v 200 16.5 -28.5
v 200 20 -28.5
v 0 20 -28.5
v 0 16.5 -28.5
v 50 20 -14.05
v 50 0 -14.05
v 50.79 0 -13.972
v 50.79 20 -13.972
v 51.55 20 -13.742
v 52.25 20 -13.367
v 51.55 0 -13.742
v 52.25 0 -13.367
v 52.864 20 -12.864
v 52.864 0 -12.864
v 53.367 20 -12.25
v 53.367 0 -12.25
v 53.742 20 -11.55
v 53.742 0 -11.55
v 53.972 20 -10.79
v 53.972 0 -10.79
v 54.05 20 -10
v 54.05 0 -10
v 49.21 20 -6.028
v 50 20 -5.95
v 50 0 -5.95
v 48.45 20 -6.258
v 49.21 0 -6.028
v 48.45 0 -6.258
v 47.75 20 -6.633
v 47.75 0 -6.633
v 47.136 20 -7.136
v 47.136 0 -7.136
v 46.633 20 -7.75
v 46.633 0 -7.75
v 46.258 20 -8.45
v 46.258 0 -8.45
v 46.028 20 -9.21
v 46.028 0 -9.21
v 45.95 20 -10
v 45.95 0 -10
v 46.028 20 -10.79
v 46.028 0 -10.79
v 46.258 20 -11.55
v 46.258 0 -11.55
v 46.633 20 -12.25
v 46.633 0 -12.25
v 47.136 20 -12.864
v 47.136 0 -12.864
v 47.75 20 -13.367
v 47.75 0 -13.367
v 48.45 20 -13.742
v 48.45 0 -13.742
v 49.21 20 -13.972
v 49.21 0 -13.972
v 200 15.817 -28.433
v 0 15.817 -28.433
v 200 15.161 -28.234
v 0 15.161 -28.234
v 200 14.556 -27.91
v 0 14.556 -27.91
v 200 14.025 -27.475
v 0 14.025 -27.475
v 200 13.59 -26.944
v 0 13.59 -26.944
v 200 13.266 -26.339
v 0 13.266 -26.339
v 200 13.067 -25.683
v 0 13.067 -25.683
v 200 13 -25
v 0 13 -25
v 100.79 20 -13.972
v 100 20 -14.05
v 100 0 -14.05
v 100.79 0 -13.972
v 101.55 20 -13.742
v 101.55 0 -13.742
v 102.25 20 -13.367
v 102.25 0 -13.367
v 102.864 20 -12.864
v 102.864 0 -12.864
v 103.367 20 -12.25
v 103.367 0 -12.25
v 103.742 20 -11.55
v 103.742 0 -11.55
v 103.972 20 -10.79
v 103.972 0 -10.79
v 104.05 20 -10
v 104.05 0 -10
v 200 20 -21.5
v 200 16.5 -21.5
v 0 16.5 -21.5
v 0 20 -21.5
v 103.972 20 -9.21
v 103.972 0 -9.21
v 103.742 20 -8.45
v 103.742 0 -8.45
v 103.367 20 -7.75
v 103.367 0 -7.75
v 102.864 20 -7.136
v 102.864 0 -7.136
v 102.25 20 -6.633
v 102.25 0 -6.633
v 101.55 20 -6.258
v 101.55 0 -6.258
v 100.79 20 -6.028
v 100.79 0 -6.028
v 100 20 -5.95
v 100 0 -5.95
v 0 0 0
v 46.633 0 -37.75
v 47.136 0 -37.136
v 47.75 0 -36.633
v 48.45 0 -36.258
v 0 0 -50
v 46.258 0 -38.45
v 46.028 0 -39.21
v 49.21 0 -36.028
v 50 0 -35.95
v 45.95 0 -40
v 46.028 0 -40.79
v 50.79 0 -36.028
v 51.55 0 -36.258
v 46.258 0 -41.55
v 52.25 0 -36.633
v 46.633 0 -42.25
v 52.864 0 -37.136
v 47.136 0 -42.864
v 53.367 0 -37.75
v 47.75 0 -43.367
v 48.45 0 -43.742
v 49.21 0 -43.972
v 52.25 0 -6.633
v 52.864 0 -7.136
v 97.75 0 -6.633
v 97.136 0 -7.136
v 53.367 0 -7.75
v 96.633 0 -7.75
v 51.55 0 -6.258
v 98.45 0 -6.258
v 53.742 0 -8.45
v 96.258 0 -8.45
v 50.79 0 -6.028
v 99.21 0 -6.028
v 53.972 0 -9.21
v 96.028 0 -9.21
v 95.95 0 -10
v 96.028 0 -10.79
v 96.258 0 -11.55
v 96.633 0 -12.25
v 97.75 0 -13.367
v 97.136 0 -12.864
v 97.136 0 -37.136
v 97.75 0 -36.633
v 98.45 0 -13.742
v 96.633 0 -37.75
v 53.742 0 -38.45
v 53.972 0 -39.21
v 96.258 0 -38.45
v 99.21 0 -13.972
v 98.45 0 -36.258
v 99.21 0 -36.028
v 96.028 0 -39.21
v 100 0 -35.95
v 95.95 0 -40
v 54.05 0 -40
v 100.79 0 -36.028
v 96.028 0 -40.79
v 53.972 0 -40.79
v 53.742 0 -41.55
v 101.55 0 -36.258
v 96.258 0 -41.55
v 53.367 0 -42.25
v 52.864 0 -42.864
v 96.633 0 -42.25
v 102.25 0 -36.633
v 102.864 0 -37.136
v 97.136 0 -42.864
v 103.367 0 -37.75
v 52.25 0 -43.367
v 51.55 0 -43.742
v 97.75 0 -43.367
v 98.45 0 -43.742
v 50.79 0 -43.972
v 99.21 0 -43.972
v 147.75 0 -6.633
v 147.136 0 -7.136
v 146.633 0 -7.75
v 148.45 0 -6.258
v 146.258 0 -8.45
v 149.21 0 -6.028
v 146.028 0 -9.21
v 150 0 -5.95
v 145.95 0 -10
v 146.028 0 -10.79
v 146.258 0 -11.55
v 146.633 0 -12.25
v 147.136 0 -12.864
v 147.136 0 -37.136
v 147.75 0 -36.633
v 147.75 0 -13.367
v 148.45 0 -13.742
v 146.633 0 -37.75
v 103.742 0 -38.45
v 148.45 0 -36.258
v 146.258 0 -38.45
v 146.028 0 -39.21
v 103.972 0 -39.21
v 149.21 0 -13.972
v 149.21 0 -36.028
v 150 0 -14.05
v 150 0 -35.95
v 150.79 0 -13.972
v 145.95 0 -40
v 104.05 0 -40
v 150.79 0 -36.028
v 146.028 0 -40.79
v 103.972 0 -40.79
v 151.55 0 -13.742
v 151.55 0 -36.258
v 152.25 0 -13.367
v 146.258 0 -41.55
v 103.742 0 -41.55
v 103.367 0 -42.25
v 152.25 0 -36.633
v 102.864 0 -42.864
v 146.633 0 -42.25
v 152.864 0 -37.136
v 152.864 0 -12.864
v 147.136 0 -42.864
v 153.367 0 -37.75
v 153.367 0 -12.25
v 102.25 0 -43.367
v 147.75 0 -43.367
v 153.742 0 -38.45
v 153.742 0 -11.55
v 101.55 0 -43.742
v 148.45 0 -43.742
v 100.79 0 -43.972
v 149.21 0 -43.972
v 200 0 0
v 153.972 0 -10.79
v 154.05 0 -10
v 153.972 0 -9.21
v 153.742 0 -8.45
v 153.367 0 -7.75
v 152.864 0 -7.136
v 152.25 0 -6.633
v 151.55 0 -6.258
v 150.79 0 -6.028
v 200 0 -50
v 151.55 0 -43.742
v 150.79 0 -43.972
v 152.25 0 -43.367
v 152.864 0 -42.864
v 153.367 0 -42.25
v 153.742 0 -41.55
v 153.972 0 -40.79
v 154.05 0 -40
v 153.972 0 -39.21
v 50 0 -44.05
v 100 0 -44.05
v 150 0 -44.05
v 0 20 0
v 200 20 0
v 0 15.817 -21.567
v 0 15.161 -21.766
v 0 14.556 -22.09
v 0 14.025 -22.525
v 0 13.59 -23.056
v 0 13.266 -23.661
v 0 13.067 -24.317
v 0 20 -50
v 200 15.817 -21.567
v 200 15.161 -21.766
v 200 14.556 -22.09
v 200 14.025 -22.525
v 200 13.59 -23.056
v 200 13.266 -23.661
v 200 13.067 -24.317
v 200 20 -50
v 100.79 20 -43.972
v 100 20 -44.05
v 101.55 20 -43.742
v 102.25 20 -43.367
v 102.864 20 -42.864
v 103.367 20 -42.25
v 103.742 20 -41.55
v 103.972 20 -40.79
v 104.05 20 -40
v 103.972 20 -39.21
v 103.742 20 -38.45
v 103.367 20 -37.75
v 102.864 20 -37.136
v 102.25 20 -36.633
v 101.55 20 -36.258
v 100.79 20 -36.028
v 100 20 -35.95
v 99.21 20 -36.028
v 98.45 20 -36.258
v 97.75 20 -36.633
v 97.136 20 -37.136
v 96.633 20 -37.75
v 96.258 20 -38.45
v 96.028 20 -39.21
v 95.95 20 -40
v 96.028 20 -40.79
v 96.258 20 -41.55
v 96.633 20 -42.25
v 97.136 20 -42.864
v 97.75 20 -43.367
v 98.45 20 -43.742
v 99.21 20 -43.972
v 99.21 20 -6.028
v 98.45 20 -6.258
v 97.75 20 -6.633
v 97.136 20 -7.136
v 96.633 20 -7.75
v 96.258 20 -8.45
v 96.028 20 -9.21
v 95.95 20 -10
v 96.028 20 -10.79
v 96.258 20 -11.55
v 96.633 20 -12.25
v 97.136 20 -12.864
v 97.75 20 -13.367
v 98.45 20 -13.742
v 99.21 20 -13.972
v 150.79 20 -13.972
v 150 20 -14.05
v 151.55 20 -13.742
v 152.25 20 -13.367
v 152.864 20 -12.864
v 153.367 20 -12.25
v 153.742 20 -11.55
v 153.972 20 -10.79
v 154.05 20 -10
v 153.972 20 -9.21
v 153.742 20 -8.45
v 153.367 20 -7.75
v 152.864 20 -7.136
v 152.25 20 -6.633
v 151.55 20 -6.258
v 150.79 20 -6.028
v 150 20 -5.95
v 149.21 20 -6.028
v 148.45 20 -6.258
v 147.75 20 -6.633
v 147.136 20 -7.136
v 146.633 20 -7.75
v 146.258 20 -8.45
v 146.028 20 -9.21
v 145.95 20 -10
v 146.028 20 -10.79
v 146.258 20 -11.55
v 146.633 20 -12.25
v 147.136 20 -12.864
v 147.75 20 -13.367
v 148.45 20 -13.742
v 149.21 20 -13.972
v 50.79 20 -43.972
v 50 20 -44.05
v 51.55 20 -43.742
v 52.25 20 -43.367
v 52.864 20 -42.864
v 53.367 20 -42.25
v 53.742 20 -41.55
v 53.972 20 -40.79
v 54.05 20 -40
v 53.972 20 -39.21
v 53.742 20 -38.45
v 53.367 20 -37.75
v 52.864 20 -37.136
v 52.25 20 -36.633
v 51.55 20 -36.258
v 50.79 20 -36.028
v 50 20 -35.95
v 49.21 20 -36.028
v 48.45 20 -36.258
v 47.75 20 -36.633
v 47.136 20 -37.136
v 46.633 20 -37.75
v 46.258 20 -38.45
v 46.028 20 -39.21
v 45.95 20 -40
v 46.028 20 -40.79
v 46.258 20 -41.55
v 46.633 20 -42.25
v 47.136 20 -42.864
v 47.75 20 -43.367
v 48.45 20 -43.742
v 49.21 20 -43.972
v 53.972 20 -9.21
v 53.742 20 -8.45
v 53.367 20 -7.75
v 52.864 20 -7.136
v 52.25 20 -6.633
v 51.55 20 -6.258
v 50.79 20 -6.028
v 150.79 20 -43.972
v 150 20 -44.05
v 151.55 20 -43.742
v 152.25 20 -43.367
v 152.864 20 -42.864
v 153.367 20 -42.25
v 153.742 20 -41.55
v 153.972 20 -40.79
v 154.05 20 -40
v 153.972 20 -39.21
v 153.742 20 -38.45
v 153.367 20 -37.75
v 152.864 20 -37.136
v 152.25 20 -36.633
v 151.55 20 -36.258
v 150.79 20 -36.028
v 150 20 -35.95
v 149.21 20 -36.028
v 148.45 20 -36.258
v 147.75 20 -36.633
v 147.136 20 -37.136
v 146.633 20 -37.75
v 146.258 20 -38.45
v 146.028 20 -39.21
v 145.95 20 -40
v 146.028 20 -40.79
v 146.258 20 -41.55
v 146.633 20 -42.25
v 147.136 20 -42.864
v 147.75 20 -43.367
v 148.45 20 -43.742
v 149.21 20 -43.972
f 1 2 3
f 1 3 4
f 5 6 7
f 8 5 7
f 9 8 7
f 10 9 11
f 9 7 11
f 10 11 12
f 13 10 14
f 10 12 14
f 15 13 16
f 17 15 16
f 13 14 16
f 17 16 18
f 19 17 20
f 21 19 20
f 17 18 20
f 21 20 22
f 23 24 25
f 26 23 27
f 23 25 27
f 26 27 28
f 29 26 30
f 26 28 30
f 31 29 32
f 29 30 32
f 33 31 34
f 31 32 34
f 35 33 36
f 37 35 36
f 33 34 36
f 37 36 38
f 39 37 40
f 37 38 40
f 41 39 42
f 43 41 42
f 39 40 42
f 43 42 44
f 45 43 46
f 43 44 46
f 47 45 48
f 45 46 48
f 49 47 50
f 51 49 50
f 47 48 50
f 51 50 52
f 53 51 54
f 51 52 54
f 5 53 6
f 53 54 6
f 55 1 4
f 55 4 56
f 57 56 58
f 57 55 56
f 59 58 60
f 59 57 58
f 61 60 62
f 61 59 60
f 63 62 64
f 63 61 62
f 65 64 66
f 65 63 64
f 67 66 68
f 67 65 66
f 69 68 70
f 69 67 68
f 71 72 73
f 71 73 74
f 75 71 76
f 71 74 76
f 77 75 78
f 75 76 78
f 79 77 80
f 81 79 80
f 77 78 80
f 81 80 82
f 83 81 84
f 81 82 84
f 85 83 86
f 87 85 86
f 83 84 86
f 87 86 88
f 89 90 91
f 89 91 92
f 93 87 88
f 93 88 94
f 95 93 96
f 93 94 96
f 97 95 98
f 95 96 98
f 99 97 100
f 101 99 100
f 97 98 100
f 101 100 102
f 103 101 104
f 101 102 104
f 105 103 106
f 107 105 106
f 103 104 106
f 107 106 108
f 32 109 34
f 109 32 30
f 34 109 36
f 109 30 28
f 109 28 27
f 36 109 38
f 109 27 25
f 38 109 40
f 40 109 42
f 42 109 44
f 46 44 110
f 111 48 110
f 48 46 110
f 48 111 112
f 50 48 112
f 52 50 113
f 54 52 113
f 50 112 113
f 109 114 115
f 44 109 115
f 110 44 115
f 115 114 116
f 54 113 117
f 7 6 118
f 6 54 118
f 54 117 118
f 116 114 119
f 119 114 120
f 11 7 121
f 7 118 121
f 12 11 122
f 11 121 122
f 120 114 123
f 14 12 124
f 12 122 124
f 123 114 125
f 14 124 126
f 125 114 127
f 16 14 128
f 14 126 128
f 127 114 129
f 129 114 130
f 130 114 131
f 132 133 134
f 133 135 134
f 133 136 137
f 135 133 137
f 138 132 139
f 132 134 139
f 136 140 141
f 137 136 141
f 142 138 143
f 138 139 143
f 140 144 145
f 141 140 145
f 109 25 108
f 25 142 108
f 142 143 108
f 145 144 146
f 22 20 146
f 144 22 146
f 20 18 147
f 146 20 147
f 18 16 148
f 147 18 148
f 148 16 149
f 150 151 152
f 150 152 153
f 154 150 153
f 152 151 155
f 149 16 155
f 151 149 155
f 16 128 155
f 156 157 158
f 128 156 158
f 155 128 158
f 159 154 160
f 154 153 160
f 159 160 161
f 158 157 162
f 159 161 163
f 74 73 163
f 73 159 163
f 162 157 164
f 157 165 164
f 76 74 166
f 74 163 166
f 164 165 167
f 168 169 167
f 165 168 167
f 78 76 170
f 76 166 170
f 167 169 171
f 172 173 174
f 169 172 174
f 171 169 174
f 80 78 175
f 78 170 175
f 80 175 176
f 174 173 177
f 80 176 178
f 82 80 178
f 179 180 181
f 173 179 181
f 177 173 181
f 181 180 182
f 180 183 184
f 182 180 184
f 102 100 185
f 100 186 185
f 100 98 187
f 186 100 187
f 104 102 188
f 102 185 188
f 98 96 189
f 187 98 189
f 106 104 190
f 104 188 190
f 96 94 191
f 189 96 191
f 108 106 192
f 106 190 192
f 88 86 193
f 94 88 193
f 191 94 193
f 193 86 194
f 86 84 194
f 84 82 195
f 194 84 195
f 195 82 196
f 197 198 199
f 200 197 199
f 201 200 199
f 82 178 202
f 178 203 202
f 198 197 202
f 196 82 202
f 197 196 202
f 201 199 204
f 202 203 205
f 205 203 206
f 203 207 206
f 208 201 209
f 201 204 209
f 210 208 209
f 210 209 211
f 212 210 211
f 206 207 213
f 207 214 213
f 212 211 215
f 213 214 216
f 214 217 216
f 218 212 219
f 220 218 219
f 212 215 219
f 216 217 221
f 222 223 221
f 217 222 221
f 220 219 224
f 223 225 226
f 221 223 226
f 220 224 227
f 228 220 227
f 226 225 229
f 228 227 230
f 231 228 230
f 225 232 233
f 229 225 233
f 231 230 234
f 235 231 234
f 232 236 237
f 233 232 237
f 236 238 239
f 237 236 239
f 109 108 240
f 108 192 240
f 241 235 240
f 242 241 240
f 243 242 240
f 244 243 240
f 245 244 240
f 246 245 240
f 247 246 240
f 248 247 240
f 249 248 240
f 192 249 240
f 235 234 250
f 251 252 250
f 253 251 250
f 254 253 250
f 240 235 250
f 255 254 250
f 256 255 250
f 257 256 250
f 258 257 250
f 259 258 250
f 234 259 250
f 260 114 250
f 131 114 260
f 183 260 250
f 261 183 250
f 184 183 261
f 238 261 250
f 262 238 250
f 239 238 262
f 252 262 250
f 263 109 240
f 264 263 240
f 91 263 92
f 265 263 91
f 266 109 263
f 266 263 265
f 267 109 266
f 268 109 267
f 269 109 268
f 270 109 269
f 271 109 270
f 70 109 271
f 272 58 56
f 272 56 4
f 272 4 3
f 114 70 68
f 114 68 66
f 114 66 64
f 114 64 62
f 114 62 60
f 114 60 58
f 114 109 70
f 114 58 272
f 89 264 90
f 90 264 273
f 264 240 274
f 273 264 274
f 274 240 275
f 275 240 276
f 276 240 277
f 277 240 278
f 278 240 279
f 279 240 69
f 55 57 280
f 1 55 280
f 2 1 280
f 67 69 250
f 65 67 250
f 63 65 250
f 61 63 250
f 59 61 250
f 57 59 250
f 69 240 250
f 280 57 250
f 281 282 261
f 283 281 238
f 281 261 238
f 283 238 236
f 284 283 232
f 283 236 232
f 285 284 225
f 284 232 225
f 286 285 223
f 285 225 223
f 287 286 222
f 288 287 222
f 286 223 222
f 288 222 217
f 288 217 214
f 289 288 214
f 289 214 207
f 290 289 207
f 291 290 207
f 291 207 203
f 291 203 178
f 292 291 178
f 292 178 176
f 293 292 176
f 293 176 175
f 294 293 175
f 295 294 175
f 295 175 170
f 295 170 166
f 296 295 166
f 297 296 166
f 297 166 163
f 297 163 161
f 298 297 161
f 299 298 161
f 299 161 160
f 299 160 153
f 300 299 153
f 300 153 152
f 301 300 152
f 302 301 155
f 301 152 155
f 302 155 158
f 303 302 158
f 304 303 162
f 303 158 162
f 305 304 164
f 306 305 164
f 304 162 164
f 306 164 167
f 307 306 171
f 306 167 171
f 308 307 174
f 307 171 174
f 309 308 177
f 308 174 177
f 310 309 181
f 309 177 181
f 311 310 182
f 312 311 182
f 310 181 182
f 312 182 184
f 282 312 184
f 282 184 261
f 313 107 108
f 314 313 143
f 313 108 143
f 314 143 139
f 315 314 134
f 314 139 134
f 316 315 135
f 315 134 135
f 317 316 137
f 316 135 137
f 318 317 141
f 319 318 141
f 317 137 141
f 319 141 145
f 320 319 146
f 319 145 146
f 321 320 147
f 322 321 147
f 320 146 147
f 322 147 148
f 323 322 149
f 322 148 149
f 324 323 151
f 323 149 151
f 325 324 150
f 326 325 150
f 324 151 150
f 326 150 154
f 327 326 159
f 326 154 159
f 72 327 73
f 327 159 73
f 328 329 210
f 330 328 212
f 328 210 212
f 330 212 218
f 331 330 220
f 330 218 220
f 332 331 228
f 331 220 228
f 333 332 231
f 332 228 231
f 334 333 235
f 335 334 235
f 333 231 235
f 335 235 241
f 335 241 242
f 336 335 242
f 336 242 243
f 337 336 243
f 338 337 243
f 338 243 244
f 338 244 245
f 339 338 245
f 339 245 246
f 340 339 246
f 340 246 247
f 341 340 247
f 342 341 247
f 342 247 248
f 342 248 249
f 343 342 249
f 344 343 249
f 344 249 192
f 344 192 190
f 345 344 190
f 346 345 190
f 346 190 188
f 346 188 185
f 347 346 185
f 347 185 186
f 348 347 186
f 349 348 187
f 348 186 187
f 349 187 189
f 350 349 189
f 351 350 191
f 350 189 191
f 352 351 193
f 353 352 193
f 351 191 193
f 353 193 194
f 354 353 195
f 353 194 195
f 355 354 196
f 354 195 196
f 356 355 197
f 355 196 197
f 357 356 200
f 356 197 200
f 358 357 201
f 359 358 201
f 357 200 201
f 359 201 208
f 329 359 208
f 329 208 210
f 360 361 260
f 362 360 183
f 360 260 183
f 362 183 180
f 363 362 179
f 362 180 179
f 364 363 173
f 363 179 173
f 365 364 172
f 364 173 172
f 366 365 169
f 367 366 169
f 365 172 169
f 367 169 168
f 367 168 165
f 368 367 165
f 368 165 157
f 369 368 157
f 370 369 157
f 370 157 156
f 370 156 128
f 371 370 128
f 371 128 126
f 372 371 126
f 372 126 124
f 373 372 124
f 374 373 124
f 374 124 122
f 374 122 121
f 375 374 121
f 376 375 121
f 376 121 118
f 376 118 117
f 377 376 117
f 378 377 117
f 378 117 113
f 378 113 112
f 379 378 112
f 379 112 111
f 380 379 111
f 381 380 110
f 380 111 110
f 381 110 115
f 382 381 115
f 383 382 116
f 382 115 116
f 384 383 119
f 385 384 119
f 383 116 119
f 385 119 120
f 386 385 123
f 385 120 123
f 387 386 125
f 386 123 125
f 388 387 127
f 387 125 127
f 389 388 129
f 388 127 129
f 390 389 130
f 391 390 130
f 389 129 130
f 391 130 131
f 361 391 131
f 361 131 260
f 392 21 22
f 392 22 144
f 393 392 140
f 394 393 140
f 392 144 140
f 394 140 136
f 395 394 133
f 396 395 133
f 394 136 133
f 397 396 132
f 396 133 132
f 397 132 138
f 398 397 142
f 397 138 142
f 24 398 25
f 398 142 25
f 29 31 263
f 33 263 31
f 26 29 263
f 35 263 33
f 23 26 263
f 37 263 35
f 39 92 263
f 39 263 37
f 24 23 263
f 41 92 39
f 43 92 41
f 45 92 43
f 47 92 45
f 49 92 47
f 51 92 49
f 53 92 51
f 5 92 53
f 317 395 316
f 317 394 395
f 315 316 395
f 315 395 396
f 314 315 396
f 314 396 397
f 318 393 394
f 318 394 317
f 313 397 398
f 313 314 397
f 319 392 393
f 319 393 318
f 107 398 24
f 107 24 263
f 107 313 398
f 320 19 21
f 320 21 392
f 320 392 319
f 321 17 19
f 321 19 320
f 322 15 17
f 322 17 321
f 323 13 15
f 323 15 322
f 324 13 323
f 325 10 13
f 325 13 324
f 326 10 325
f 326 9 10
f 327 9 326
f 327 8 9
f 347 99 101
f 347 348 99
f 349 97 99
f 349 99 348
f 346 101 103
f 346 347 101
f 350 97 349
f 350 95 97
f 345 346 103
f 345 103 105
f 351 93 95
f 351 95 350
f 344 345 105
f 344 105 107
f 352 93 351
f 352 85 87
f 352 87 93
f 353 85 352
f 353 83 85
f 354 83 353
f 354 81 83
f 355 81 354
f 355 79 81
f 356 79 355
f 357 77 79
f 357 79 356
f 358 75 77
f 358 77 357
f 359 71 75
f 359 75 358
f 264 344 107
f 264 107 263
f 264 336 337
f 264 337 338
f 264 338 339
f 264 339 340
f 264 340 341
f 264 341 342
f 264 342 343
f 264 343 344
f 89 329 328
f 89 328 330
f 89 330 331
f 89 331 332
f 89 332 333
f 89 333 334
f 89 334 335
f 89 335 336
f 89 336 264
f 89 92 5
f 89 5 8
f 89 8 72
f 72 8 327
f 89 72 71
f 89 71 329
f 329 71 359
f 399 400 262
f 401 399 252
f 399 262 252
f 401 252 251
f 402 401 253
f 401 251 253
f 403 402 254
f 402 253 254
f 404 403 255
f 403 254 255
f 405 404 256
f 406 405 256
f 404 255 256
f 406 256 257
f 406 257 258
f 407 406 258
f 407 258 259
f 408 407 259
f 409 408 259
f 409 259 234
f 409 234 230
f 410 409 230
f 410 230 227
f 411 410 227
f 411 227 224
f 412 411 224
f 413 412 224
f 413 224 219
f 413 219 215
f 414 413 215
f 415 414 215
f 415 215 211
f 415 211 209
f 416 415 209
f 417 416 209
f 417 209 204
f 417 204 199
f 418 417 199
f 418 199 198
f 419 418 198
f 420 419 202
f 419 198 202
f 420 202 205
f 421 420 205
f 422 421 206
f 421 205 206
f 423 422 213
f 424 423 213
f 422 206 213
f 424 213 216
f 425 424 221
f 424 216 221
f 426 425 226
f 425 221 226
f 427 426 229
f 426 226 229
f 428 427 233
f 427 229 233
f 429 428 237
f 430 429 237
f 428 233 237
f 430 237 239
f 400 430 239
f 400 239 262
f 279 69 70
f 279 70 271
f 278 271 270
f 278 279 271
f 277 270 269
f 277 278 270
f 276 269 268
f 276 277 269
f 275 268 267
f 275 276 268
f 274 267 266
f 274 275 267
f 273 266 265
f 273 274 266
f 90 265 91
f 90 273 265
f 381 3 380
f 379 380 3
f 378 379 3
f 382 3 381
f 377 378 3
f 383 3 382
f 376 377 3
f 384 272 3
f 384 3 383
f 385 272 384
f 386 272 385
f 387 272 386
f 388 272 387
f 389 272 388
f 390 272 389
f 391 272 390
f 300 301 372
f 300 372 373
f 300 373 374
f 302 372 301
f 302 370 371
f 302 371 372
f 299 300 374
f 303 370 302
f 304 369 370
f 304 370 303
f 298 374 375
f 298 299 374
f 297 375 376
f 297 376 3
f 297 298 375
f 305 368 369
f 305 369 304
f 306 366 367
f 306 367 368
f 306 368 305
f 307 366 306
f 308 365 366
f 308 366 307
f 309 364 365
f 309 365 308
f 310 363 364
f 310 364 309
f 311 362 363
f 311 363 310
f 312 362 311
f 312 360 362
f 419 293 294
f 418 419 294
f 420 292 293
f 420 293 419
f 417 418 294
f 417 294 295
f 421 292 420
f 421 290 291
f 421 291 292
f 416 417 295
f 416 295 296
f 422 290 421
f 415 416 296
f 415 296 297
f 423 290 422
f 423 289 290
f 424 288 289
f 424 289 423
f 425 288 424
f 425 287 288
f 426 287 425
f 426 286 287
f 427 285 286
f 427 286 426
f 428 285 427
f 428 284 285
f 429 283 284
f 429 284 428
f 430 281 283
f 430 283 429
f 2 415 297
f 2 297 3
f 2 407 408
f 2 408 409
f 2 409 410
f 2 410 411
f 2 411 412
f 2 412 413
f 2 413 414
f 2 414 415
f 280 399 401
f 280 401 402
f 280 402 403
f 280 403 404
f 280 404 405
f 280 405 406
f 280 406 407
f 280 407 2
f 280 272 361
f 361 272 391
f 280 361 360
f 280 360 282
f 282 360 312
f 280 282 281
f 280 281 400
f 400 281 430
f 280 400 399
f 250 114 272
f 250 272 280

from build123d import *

# Parameters (mm, degrees)
SKETCH1_W               = 200
SKETCH1_H               = 50
BOSS_EXTRUDE1_DEPTH     = 20
CUT_EXTRUDE1_DEPTH      = 30
CUT_EXTRUDE1_DEPTH_BACK = 221
SKETCH3_R               = 4.05
CUT_EXTRUDE2_DEPTH      = 67


with BuildPart() as part:
    # Sketch1 → Boss-Extrude1 (new body)
    with BuildSketch(Plane(origin=(0, 0, 0), x_dir=(1, 0, 0), z_dir=(0, 1, 0))):
        with Locations((100, 25)):
            Rectangle(SKETCH1_W, SKETCH1_H)
    extrude(amount=BOSS_EXTRUDE1_DEPTH)

    # Sketch2 → Cut-Extrude1 (cut, two sides: drawn at the far end of the back side and taken through both)
    with BuildSketch(Plane.ZY.offset(-CUT_EXTRUDE1_DEPTH_BACK)):
        with BuildLine():
            Line((-25, 20), (-28.5, 20))
            Line((-28.5, 20), (-28.5, 16.5))
            ThreePointArc((-28.5, 16.5), (-27.474873734, 18.974873734), (-25, 20))
        make_face()
        with BuildLine():
            ThreePointArc((-21.5, 16.5), (-22.525126266, 18.974873734), (-25, 20))
            Line((-25, 20), (-25, 13))
            ThreePointArc((-25, 13), (-22.525126266, 14.025126266), (-21.5, 16.5))
        make_face()
        with BuildLine():
            Line((-25, 13), (-25, 20))
            ThreePointArc((-25, 20), (-27.474873734, 18.974873734), (-28.5, 16.5))
            ThreePointArc((-28.5, 16.5), (-27.474873734, 14.025126266), (-25, 13))
        make_face()
        with BuildLine():
            Line((-21.5, 20), (-25, 20))
            ThreePointArc((-25, 20), (-22.525126266, 18.974873734), (-21.5, 16.5))
            Line((-21.5, 16.5), (-21.5, 20))
        make_face()
    extrude(amount=CUT_EXTRUDE1_DEPTH + CUT_EXTRUDE1_DEPTH_BACK, mode=Mode.SUBTRACT)

    # Sketch3 → Cut-Extrude2 (cut)
    with BuildSketch(Plane.XZ):
        with BuildLine():
            ThreePointArc((104.05, -10), (102.863782464, -7.136217536), (100, -5.95))
            Line((100, -5.95), (100, -14.05))
            ThreePointArc((100, -14.05), (102.863782464, -12.863782464), (104.05, -10))
        make_face()
        with BuildLine():
            Line((100, -14.05), (100, -5.95))
            ThreePointArc((100, -5.95), (95.95, -10), (100, -14.05))
        make_face()
        with BuildLine():
            ThreePointArc((54.05, -10), (52.863782464, -7.136217536), (50, -5.95))
            Line((50, -5.95), (50, -14.05))
            ThreePointArc((50, -14.05), (52.863782464, -12.863782464), (54.05, -10))
        make_face()
        with BuildLine():
            Line((50, -14.05), (50, -5.95))
            ThreePointArc((50, -5.95), (45.95, -10), (50, -14.05))
        make_face()
        with Locations(Location((50, -40, 0), (0, 0, 270))):
            Circle(SKETCH3_R)
        with Locations(Location((100, -40, 0), (0, 0, 270))):
            Circle(SKETCH3_R)
        with Locations(Location((150, -40, 0), (0, 0, 270))):
            Circle(SKETCH3_R)
        with Locations(Location((150, -10, 0), (0, 0, 270))):
            Circle(SKETCH3_R)
    extrude(amount=-CUT_EXTRUDE2_DEPTH, mode=Mode.SUBTRACT)


solid = part.part
